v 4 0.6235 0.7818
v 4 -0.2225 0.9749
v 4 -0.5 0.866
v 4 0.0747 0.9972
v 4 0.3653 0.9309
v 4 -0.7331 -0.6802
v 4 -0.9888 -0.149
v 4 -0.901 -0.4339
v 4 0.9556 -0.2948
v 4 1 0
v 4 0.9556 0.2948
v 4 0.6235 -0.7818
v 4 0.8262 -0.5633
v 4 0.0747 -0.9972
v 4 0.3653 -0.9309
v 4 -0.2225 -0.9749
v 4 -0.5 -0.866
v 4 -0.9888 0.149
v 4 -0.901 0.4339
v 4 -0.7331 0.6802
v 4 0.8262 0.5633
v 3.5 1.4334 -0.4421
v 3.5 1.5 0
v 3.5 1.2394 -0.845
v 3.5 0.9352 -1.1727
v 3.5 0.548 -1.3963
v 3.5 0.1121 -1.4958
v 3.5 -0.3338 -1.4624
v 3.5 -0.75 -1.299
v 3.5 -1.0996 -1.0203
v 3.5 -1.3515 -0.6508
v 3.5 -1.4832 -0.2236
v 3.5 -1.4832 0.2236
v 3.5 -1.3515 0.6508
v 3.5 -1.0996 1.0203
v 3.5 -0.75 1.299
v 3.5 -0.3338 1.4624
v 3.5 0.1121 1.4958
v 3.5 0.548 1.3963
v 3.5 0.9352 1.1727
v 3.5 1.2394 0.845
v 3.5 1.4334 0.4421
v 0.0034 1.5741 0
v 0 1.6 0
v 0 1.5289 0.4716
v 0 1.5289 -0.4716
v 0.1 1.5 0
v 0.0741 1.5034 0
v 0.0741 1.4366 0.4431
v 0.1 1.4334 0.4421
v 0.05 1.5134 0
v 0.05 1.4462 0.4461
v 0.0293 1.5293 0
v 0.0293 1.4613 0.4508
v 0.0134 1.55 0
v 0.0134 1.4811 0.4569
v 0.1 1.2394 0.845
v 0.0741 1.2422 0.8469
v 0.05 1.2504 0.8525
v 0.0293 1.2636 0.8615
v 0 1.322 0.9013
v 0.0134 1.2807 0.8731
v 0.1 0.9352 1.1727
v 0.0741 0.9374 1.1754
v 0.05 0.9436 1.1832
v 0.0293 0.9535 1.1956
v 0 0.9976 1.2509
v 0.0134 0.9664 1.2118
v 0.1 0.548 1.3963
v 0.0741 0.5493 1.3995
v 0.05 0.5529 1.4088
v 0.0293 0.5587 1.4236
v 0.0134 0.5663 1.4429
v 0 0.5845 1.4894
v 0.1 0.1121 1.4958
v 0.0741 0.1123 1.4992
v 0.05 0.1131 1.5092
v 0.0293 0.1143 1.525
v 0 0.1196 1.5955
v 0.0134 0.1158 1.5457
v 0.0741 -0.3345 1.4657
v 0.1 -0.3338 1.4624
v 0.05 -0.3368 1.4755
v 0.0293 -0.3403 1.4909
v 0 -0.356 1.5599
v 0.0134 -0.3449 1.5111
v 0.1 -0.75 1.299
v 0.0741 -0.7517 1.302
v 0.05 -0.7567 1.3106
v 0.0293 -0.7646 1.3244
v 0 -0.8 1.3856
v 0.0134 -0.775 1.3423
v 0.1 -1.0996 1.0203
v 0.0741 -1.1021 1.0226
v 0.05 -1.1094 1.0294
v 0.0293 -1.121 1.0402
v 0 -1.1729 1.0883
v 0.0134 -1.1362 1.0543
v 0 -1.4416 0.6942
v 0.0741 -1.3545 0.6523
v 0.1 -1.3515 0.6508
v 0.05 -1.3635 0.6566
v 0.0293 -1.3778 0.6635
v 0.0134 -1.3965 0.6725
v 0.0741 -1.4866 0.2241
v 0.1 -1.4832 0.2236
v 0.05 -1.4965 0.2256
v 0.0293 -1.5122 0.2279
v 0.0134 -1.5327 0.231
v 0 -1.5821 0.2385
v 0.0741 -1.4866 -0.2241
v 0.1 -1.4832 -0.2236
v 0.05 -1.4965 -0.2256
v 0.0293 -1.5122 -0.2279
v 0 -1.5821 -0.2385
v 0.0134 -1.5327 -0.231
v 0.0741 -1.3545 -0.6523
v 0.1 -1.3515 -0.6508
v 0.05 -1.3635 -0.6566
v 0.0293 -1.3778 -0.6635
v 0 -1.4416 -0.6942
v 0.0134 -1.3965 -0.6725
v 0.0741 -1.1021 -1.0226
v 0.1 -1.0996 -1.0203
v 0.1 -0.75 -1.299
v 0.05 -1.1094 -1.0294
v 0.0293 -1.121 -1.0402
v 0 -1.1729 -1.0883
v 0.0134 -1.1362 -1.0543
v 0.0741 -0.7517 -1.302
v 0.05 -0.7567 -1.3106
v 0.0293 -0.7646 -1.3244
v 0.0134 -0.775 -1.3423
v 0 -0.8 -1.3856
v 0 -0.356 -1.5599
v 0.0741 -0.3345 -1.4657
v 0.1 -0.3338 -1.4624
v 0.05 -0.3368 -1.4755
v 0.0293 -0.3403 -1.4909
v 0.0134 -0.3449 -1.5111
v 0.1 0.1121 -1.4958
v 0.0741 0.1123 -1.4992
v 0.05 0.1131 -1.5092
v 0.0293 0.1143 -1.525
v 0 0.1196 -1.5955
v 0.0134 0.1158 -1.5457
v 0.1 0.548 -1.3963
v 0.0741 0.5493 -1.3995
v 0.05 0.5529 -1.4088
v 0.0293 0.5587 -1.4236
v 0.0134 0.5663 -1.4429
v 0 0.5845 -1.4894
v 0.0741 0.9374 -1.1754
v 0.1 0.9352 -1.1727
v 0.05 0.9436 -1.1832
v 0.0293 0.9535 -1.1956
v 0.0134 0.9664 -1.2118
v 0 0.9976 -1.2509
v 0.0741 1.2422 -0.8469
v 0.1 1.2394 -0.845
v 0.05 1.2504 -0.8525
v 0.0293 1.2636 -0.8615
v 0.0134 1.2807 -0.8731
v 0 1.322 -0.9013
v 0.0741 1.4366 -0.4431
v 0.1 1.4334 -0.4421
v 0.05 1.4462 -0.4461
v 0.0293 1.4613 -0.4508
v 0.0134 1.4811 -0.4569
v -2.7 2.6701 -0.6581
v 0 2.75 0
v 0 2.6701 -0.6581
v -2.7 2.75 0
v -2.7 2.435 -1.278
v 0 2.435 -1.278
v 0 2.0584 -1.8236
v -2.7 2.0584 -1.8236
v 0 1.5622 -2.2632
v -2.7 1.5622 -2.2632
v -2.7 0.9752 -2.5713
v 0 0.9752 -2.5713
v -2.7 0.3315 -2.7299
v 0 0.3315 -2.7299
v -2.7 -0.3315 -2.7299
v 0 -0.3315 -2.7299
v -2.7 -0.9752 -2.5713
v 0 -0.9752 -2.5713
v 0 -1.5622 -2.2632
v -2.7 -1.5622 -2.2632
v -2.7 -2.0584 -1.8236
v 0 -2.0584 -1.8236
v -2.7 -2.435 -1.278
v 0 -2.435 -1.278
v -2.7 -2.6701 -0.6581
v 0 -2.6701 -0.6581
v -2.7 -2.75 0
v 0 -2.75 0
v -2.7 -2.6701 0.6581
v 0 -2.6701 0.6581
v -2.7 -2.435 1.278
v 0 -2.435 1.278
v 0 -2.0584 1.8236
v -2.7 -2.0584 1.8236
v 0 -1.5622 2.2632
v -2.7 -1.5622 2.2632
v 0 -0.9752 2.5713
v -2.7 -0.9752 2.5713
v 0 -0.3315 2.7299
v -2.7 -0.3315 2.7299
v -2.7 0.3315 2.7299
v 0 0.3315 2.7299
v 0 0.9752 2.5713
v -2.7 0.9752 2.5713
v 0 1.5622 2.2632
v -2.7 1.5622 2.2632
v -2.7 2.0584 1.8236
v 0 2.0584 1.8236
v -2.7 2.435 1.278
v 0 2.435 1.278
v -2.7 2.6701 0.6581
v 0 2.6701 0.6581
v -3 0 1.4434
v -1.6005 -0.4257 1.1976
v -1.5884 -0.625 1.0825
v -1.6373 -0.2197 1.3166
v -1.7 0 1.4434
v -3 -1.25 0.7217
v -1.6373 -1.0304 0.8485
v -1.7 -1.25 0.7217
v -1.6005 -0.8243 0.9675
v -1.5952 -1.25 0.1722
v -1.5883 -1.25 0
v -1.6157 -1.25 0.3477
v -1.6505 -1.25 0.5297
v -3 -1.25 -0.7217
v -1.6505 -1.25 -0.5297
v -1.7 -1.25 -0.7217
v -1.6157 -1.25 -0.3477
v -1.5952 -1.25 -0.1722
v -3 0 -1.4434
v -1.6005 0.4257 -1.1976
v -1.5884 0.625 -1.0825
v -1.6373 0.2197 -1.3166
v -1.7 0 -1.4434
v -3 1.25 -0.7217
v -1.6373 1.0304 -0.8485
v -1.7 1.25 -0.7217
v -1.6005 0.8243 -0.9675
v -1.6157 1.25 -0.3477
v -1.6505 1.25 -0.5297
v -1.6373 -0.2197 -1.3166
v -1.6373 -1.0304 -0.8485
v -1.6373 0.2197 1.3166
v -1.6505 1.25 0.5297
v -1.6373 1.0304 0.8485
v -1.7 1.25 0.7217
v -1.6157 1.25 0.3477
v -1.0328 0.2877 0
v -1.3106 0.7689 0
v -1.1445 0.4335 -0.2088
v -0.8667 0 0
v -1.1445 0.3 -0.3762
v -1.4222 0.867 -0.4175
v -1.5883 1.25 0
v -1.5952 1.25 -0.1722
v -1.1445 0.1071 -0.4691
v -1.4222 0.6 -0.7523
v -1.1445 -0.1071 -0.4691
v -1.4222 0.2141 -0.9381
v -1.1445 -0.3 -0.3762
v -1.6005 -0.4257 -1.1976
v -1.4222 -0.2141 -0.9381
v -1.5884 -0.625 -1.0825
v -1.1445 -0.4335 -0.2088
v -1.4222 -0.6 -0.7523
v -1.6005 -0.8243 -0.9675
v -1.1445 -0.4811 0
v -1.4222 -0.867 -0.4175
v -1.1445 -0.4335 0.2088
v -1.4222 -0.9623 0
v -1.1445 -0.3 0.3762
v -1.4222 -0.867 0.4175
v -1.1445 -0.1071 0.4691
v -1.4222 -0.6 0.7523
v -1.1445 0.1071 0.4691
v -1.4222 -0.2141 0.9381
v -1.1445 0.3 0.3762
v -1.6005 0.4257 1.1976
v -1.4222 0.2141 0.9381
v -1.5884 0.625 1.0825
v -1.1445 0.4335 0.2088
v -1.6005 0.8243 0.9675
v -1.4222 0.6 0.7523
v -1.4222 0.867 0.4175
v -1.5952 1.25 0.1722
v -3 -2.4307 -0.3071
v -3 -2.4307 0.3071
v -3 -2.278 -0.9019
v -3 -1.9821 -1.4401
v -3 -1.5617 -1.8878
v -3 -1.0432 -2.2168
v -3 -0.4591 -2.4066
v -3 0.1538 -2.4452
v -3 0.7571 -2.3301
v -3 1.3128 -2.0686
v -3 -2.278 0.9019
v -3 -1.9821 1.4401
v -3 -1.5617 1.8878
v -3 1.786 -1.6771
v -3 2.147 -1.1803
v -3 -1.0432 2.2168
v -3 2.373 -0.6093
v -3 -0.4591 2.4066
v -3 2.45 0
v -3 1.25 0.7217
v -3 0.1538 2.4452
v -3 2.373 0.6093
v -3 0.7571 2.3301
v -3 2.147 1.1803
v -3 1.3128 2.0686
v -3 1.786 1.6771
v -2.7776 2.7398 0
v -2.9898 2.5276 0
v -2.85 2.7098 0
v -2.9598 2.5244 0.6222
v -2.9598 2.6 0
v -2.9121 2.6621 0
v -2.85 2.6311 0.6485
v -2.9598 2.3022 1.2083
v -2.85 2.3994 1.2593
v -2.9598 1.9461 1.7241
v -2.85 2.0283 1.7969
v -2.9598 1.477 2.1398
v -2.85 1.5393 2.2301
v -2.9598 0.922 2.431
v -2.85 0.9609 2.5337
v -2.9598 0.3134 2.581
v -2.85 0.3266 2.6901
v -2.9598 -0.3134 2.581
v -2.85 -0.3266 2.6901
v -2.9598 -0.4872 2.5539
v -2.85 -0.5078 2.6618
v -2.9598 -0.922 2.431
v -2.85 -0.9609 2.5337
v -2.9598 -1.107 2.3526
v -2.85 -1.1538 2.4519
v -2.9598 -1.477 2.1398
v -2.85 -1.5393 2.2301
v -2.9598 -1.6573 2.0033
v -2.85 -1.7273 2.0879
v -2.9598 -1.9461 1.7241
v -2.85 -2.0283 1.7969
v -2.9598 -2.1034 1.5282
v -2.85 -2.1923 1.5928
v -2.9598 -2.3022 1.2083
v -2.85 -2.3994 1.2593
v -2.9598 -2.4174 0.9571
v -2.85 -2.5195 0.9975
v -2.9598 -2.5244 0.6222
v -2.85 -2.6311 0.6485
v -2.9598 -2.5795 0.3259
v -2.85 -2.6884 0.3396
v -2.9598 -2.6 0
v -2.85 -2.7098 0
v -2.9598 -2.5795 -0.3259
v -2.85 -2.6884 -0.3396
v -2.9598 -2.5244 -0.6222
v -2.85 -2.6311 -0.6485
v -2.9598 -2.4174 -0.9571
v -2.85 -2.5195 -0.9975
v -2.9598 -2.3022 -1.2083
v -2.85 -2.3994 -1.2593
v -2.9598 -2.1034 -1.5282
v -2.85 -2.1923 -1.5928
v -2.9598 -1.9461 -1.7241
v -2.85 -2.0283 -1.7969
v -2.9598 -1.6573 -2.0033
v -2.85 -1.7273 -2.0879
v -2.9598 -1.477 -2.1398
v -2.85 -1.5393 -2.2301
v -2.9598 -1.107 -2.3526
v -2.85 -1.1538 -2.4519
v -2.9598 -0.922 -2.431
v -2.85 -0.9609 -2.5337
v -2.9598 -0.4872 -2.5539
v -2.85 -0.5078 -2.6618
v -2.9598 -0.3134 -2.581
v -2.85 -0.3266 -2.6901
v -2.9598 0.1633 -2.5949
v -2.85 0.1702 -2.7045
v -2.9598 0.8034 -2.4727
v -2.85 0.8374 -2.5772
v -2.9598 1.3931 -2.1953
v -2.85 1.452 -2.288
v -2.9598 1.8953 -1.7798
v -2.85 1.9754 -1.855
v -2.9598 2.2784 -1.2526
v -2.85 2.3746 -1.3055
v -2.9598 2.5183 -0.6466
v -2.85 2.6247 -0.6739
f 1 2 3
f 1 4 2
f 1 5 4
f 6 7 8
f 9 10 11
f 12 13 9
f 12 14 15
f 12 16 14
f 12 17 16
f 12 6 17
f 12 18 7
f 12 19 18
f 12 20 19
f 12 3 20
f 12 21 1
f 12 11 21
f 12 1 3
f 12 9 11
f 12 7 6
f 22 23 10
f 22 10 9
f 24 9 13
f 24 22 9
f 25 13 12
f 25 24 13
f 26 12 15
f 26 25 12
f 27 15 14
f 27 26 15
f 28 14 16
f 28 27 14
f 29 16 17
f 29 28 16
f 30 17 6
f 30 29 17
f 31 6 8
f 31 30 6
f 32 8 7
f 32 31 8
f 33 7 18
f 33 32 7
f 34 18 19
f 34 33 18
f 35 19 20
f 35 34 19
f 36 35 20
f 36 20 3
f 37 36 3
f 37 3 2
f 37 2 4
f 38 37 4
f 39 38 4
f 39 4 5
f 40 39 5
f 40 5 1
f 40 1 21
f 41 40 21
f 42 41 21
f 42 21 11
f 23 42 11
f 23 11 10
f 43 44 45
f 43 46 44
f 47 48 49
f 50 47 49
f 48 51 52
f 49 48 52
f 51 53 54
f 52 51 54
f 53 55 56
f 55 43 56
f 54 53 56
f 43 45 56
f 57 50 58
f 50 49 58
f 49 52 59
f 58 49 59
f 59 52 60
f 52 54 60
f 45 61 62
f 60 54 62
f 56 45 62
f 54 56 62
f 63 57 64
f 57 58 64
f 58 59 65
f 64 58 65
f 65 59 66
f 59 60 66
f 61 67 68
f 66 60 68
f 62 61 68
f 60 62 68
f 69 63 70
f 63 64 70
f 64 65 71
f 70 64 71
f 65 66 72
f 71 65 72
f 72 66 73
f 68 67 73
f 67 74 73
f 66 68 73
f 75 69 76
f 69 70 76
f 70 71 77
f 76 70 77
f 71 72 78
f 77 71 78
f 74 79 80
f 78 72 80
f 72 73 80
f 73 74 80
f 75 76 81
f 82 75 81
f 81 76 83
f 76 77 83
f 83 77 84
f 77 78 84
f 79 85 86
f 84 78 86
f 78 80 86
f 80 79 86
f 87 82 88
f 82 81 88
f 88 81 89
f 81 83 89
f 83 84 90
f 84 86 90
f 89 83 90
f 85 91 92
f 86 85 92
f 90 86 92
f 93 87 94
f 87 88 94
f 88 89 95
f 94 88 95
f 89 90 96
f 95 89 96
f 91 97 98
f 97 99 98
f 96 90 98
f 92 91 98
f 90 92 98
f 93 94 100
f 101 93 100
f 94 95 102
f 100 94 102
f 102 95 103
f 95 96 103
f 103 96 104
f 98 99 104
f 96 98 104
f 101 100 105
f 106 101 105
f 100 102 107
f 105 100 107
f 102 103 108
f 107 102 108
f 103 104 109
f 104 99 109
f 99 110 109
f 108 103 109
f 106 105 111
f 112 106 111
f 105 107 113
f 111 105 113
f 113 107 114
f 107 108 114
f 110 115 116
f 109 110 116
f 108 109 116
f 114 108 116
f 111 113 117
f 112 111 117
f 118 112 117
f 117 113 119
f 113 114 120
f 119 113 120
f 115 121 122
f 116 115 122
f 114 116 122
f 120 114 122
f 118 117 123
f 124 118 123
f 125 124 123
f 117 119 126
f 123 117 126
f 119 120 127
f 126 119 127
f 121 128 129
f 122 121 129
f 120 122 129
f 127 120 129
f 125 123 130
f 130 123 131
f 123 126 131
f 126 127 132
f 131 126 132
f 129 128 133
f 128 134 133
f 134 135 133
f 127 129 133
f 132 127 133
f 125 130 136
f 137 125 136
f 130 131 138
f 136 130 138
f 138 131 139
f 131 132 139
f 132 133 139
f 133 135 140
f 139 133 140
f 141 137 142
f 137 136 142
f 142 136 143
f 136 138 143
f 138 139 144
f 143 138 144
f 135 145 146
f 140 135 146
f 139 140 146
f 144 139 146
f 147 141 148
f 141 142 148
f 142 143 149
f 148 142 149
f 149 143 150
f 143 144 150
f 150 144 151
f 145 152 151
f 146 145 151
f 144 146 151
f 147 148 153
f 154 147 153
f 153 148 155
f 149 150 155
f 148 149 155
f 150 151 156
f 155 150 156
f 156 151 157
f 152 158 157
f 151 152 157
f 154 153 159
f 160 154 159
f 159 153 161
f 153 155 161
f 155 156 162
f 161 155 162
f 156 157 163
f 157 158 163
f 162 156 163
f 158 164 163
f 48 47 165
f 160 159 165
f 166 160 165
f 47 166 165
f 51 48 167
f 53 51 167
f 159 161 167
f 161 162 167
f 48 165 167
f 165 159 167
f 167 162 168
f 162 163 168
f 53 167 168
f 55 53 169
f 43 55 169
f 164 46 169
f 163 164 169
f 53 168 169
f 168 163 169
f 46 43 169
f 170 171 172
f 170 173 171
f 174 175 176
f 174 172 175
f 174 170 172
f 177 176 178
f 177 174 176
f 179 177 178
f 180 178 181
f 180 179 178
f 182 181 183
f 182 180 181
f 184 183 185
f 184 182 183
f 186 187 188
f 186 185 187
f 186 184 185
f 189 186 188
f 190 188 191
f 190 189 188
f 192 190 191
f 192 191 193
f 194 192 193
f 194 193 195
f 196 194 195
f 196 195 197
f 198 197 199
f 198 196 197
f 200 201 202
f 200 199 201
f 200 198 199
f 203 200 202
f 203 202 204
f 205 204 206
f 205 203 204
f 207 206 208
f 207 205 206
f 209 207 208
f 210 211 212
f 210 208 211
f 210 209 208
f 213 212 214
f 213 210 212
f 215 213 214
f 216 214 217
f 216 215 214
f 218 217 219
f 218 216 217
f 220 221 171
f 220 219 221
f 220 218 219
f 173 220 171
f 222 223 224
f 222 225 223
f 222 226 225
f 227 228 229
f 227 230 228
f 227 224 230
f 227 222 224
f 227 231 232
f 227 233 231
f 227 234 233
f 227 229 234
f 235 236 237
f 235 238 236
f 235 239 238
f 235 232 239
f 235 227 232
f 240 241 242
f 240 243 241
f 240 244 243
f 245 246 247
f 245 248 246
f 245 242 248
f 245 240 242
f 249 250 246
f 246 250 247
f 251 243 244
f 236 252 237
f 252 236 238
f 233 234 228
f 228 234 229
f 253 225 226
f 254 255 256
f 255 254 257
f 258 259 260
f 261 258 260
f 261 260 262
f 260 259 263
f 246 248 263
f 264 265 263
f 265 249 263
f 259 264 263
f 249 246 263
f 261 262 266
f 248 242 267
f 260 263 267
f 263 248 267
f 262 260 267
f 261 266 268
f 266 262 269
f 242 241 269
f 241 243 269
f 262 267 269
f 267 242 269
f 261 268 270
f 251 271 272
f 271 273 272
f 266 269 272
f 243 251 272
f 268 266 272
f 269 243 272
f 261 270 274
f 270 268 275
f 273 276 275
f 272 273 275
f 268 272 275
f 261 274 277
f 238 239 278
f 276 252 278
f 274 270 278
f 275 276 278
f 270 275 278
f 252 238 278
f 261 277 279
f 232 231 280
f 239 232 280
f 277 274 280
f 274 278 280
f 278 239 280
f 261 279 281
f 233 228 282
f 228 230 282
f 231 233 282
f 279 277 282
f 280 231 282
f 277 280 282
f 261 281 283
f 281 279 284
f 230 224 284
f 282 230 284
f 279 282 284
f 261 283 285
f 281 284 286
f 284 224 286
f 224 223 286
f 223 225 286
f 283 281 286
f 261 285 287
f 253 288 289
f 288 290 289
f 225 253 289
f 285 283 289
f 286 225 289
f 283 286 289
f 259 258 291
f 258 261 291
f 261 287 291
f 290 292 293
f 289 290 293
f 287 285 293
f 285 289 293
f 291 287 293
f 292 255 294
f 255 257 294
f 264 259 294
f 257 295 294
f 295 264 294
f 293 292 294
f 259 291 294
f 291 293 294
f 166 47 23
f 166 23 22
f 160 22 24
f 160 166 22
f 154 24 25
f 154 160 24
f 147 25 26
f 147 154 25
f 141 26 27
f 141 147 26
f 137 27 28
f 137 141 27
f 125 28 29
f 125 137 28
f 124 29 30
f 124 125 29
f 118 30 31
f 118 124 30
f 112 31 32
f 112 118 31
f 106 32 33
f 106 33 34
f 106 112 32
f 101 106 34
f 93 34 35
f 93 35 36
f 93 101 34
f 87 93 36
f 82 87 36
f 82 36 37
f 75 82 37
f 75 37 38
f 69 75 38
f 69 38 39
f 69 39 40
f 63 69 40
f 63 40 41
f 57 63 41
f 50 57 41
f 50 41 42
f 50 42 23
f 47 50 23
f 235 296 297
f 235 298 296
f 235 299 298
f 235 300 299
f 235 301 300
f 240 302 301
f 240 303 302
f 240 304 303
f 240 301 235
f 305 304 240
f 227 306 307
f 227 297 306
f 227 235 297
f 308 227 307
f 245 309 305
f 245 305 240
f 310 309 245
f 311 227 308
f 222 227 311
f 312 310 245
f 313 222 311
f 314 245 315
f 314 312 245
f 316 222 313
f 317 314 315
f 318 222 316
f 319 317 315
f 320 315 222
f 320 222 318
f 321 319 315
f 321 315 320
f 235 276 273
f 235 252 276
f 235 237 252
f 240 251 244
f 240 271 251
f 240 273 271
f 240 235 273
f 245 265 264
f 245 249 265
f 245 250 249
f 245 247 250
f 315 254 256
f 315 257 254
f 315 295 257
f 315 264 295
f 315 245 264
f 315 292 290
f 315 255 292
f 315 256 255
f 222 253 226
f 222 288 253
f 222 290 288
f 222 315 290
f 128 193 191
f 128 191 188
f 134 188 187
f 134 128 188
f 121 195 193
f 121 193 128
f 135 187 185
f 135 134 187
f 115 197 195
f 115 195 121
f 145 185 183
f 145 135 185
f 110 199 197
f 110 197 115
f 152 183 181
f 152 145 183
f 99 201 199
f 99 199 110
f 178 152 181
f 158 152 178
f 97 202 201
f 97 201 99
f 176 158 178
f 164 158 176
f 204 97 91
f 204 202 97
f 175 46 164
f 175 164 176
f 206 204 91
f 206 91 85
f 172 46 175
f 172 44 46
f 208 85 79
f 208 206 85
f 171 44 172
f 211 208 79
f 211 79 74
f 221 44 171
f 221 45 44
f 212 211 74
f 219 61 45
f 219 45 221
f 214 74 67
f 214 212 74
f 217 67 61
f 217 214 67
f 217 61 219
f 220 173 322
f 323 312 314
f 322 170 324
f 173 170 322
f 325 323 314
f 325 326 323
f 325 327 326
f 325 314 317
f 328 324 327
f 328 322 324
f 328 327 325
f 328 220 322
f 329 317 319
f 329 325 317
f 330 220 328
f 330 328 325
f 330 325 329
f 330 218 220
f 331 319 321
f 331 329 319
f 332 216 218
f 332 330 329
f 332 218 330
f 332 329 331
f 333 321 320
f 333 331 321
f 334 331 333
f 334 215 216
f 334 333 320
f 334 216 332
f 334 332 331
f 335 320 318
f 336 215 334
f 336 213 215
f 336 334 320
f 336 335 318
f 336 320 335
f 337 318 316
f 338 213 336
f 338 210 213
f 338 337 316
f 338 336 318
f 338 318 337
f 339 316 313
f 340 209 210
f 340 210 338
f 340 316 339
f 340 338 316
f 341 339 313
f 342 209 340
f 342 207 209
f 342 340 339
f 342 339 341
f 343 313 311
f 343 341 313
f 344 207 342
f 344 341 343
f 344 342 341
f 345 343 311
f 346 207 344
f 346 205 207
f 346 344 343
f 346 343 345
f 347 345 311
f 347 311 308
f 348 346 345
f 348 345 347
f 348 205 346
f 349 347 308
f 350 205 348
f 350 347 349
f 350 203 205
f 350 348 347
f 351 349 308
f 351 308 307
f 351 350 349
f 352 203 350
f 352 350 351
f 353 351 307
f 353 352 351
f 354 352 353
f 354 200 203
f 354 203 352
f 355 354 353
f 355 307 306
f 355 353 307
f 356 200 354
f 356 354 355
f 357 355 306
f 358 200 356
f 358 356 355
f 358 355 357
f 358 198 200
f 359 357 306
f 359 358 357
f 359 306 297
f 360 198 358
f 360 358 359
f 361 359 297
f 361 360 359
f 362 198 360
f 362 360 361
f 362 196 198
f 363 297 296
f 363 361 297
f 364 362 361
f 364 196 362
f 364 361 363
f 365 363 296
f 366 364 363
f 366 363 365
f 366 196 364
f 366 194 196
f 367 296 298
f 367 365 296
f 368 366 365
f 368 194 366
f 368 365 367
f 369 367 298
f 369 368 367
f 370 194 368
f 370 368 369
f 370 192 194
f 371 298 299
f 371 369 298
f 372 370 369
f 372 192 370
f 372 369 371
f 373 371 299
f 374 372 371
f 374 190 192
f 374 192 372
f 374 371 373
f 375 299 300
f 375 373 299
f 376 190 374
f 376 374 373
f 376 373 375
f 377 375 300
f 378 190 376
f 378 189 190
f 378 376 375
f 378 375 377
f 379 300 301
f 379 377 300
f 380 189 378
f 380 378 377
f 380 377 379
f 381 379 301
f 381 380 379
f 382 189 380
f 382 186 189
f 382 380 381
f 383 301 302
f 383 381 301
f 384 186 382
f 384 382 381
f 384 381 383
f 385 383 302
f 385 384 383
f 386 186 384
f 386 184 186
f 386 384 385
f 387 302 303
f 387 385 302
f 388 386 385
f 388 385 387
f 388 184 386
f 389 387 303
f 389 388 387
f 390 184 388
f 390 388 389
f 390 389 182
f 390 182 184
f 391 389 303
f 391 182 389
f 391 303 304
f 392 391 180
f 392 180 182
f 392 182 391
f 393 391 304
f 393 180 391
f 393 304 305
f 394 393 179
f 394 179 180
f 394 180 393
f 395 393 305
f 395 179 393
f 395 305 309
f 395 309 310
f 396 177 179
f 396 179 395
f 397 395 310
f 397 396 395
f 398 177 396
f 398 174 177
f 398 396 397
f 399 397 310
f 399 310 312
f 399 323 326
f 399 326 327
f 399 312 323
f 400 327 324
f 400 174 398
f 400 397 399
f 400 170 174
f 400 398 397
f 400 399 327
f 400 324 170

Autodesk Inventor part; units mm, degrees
ref_plane "YZ Plane" through (0, 0, 0) normal (1, 0, 0) x (0, 1, 0)
ref_plane "XZ Plane" through (0, 0, 0) normal (0, 1, 0) x (-1, 0, 0)
sketch "Sketch1" plane through (0, 0, 0) normal (0, 0, 1) x (1, 0, 0)
  line L0 (-0.8667, 0) -> (5, 0)
  line L1 (5, 0) -> (5, 1.5)
  line L2 (5, 1.5) -> (1.25, 1.5)
  line L3 (1.25, 1.5) -> (0.9432, 1.5)
  line L4 (0.9432, 1.5) -> (0, 1.5)
  line L5 (0, 1.5) -> (0, 2.75)
  line L6 (0, 2.75) -> (-3, 2.75)
  line L7 (-3, 2.75) -> (-3, 1.4434)
  line L8 (-3, 1.4434) -> (-1.7, 1.4434)
  line L9 (-1.7, 1.4434) -> (-0.8667, 0)
  line L10 (-4.6, 0) -> (6.6, 0) projected
  line L11 (0, -0.55) -> (0, 3.3) projected
  line L12 (1.25, 1.5) -> (0, 1.5) construction
  dimension "d1" = 3.75
  dimension "d2" = 0.3068
  dimension "d3" = 3
  dimension "d4" = 1.3
  dimension "d5" = 60
  dimension "d6" = 3
  dimension "d7" = 3
  dimension "d8" = 2.8868
  dimension "d9" = 5.5
  dimension "d26" = 5
revolve "Body" add sketch "Sketch1" angle 360 about axis through (-0.8667, 0, 0) along (1, 0, 0)
sketch "Sketch2" plane through (-3, 0, 0) normal (-1, 0, 0) x (0, 0, 1)
  circle A0 centre (0, 0) radius 1.4434 projected
  line L0 (0, -3.85) -> (0, 3.85) projected
  line L1 (-3.85, 0) -> (3.85, 0) projected
  line L2 (1.4434, 0) -> (0.7217, -1.25)
  line L3 (0.7217, -1.25) -> (-0.7217, -1.25)
  line L4 (-0.7217, -1.25) -> (-1.4434, 0)
  line L5 (-1.4434, 0) -> (-0.7217, 1.25)
  line L6 (-0.7217, 1.25) -> (0.7217, 1.25)
  line L7 (0.7217, 1.25) -> (1.4434, 0)
extrude "Slot" add sketch "Sketch2" against normal up to next contours L7 A0 | A0 L2 | L6 L0 A0 | A0 L0 L3 | L0 L6 A0 | A0 L3 L0 | L4 A0 | A0 L5
fillet "Fillet1" radius 0.3 1 edges at (-3, -2.75, 0)
thread "Thread" size "M3x0.5" class "6g" standard "ISO Metric profile" length 3.75
chamfer "Chamfer1" distance 0.3067 distance2 0.3067 1 edges at (5, -1.5, 0) measured on face at (5, -0.2617, -0.7882)
ref_plane "Work Plane1" through (29, 0, 0) normal (0, -1, 0) x (1, 0, 0)
fillet "Fillet2" radius 0.1 1 edges at (0, -1.5, 0)
sketch "Sketch4" plane through (5, 0, 0) normal (1, 0, 0) x (0, 0, -1)
  circle A0 centre (0, 0) radius 2.75 projected
  circle A1 centre (0, 0) radius 1.6 projected
  point P0 (0, 0)
extrude "Extrusion3" cut sketch "Sketch4" against normal blind 1 contours A1
chamfer "Chamfer3" distance 0.5 angle 45 1 edges at (4, -1.5, 0)
equation "\"d1\" = GEL"
equation "\"d3\" = KOH"
equation "\"d4\" = INTI"
equation "\"d6\" = GD"
equation "\"d7\" = BDM"
equation "\"d8\" = 1.1547 * SW"
equation "\"d9\" = KOD"
equation "\"d26\" = NLG"
equation "\"d30\" = R"
equation "\"d17\" = RR"
equation "\"d13\" = GEL"
equation "\"d15\" = -0.5 * SPD + 0.5 * GD"
equation "\"d16\" = GUL"
equation "\"GD\" = 3"
equation "\"NLG\" = 5"
equation "\"GEL\" = 3.75"
equation "\"KOD\" = 5.5"
equation "\"KOH\" = 3"
equation "\"INTI\" = 1.3"
equation "\"GAL\" = 0.61345 * PTC"
equation "\"GUL\" = 0.61345 * PTC"
equation "\"BDM\" = NND"
equation "\"SW\" = 2.5"
equation "\"RR\" = 0.3"
equation "\"SPD\" = NND - 1.2269 * PTC"
equation "\"R\" = 0.1"
equation "\"TOA\" = 30deg"
equation "\"GD1\" = THREADDIA - 1.2269 * PTC"
equation "\"THREADDIA\" = 3"
equation "\"FAWI\" = 45deg"
equation "\"PTC\" = 0.5"
equation "\"NND\" = 3"
equation "\"E0\" = 1.155 * SW"
properties part number "ISO 4762 - M3 x 4" material "Stainless Steel, 440C"
